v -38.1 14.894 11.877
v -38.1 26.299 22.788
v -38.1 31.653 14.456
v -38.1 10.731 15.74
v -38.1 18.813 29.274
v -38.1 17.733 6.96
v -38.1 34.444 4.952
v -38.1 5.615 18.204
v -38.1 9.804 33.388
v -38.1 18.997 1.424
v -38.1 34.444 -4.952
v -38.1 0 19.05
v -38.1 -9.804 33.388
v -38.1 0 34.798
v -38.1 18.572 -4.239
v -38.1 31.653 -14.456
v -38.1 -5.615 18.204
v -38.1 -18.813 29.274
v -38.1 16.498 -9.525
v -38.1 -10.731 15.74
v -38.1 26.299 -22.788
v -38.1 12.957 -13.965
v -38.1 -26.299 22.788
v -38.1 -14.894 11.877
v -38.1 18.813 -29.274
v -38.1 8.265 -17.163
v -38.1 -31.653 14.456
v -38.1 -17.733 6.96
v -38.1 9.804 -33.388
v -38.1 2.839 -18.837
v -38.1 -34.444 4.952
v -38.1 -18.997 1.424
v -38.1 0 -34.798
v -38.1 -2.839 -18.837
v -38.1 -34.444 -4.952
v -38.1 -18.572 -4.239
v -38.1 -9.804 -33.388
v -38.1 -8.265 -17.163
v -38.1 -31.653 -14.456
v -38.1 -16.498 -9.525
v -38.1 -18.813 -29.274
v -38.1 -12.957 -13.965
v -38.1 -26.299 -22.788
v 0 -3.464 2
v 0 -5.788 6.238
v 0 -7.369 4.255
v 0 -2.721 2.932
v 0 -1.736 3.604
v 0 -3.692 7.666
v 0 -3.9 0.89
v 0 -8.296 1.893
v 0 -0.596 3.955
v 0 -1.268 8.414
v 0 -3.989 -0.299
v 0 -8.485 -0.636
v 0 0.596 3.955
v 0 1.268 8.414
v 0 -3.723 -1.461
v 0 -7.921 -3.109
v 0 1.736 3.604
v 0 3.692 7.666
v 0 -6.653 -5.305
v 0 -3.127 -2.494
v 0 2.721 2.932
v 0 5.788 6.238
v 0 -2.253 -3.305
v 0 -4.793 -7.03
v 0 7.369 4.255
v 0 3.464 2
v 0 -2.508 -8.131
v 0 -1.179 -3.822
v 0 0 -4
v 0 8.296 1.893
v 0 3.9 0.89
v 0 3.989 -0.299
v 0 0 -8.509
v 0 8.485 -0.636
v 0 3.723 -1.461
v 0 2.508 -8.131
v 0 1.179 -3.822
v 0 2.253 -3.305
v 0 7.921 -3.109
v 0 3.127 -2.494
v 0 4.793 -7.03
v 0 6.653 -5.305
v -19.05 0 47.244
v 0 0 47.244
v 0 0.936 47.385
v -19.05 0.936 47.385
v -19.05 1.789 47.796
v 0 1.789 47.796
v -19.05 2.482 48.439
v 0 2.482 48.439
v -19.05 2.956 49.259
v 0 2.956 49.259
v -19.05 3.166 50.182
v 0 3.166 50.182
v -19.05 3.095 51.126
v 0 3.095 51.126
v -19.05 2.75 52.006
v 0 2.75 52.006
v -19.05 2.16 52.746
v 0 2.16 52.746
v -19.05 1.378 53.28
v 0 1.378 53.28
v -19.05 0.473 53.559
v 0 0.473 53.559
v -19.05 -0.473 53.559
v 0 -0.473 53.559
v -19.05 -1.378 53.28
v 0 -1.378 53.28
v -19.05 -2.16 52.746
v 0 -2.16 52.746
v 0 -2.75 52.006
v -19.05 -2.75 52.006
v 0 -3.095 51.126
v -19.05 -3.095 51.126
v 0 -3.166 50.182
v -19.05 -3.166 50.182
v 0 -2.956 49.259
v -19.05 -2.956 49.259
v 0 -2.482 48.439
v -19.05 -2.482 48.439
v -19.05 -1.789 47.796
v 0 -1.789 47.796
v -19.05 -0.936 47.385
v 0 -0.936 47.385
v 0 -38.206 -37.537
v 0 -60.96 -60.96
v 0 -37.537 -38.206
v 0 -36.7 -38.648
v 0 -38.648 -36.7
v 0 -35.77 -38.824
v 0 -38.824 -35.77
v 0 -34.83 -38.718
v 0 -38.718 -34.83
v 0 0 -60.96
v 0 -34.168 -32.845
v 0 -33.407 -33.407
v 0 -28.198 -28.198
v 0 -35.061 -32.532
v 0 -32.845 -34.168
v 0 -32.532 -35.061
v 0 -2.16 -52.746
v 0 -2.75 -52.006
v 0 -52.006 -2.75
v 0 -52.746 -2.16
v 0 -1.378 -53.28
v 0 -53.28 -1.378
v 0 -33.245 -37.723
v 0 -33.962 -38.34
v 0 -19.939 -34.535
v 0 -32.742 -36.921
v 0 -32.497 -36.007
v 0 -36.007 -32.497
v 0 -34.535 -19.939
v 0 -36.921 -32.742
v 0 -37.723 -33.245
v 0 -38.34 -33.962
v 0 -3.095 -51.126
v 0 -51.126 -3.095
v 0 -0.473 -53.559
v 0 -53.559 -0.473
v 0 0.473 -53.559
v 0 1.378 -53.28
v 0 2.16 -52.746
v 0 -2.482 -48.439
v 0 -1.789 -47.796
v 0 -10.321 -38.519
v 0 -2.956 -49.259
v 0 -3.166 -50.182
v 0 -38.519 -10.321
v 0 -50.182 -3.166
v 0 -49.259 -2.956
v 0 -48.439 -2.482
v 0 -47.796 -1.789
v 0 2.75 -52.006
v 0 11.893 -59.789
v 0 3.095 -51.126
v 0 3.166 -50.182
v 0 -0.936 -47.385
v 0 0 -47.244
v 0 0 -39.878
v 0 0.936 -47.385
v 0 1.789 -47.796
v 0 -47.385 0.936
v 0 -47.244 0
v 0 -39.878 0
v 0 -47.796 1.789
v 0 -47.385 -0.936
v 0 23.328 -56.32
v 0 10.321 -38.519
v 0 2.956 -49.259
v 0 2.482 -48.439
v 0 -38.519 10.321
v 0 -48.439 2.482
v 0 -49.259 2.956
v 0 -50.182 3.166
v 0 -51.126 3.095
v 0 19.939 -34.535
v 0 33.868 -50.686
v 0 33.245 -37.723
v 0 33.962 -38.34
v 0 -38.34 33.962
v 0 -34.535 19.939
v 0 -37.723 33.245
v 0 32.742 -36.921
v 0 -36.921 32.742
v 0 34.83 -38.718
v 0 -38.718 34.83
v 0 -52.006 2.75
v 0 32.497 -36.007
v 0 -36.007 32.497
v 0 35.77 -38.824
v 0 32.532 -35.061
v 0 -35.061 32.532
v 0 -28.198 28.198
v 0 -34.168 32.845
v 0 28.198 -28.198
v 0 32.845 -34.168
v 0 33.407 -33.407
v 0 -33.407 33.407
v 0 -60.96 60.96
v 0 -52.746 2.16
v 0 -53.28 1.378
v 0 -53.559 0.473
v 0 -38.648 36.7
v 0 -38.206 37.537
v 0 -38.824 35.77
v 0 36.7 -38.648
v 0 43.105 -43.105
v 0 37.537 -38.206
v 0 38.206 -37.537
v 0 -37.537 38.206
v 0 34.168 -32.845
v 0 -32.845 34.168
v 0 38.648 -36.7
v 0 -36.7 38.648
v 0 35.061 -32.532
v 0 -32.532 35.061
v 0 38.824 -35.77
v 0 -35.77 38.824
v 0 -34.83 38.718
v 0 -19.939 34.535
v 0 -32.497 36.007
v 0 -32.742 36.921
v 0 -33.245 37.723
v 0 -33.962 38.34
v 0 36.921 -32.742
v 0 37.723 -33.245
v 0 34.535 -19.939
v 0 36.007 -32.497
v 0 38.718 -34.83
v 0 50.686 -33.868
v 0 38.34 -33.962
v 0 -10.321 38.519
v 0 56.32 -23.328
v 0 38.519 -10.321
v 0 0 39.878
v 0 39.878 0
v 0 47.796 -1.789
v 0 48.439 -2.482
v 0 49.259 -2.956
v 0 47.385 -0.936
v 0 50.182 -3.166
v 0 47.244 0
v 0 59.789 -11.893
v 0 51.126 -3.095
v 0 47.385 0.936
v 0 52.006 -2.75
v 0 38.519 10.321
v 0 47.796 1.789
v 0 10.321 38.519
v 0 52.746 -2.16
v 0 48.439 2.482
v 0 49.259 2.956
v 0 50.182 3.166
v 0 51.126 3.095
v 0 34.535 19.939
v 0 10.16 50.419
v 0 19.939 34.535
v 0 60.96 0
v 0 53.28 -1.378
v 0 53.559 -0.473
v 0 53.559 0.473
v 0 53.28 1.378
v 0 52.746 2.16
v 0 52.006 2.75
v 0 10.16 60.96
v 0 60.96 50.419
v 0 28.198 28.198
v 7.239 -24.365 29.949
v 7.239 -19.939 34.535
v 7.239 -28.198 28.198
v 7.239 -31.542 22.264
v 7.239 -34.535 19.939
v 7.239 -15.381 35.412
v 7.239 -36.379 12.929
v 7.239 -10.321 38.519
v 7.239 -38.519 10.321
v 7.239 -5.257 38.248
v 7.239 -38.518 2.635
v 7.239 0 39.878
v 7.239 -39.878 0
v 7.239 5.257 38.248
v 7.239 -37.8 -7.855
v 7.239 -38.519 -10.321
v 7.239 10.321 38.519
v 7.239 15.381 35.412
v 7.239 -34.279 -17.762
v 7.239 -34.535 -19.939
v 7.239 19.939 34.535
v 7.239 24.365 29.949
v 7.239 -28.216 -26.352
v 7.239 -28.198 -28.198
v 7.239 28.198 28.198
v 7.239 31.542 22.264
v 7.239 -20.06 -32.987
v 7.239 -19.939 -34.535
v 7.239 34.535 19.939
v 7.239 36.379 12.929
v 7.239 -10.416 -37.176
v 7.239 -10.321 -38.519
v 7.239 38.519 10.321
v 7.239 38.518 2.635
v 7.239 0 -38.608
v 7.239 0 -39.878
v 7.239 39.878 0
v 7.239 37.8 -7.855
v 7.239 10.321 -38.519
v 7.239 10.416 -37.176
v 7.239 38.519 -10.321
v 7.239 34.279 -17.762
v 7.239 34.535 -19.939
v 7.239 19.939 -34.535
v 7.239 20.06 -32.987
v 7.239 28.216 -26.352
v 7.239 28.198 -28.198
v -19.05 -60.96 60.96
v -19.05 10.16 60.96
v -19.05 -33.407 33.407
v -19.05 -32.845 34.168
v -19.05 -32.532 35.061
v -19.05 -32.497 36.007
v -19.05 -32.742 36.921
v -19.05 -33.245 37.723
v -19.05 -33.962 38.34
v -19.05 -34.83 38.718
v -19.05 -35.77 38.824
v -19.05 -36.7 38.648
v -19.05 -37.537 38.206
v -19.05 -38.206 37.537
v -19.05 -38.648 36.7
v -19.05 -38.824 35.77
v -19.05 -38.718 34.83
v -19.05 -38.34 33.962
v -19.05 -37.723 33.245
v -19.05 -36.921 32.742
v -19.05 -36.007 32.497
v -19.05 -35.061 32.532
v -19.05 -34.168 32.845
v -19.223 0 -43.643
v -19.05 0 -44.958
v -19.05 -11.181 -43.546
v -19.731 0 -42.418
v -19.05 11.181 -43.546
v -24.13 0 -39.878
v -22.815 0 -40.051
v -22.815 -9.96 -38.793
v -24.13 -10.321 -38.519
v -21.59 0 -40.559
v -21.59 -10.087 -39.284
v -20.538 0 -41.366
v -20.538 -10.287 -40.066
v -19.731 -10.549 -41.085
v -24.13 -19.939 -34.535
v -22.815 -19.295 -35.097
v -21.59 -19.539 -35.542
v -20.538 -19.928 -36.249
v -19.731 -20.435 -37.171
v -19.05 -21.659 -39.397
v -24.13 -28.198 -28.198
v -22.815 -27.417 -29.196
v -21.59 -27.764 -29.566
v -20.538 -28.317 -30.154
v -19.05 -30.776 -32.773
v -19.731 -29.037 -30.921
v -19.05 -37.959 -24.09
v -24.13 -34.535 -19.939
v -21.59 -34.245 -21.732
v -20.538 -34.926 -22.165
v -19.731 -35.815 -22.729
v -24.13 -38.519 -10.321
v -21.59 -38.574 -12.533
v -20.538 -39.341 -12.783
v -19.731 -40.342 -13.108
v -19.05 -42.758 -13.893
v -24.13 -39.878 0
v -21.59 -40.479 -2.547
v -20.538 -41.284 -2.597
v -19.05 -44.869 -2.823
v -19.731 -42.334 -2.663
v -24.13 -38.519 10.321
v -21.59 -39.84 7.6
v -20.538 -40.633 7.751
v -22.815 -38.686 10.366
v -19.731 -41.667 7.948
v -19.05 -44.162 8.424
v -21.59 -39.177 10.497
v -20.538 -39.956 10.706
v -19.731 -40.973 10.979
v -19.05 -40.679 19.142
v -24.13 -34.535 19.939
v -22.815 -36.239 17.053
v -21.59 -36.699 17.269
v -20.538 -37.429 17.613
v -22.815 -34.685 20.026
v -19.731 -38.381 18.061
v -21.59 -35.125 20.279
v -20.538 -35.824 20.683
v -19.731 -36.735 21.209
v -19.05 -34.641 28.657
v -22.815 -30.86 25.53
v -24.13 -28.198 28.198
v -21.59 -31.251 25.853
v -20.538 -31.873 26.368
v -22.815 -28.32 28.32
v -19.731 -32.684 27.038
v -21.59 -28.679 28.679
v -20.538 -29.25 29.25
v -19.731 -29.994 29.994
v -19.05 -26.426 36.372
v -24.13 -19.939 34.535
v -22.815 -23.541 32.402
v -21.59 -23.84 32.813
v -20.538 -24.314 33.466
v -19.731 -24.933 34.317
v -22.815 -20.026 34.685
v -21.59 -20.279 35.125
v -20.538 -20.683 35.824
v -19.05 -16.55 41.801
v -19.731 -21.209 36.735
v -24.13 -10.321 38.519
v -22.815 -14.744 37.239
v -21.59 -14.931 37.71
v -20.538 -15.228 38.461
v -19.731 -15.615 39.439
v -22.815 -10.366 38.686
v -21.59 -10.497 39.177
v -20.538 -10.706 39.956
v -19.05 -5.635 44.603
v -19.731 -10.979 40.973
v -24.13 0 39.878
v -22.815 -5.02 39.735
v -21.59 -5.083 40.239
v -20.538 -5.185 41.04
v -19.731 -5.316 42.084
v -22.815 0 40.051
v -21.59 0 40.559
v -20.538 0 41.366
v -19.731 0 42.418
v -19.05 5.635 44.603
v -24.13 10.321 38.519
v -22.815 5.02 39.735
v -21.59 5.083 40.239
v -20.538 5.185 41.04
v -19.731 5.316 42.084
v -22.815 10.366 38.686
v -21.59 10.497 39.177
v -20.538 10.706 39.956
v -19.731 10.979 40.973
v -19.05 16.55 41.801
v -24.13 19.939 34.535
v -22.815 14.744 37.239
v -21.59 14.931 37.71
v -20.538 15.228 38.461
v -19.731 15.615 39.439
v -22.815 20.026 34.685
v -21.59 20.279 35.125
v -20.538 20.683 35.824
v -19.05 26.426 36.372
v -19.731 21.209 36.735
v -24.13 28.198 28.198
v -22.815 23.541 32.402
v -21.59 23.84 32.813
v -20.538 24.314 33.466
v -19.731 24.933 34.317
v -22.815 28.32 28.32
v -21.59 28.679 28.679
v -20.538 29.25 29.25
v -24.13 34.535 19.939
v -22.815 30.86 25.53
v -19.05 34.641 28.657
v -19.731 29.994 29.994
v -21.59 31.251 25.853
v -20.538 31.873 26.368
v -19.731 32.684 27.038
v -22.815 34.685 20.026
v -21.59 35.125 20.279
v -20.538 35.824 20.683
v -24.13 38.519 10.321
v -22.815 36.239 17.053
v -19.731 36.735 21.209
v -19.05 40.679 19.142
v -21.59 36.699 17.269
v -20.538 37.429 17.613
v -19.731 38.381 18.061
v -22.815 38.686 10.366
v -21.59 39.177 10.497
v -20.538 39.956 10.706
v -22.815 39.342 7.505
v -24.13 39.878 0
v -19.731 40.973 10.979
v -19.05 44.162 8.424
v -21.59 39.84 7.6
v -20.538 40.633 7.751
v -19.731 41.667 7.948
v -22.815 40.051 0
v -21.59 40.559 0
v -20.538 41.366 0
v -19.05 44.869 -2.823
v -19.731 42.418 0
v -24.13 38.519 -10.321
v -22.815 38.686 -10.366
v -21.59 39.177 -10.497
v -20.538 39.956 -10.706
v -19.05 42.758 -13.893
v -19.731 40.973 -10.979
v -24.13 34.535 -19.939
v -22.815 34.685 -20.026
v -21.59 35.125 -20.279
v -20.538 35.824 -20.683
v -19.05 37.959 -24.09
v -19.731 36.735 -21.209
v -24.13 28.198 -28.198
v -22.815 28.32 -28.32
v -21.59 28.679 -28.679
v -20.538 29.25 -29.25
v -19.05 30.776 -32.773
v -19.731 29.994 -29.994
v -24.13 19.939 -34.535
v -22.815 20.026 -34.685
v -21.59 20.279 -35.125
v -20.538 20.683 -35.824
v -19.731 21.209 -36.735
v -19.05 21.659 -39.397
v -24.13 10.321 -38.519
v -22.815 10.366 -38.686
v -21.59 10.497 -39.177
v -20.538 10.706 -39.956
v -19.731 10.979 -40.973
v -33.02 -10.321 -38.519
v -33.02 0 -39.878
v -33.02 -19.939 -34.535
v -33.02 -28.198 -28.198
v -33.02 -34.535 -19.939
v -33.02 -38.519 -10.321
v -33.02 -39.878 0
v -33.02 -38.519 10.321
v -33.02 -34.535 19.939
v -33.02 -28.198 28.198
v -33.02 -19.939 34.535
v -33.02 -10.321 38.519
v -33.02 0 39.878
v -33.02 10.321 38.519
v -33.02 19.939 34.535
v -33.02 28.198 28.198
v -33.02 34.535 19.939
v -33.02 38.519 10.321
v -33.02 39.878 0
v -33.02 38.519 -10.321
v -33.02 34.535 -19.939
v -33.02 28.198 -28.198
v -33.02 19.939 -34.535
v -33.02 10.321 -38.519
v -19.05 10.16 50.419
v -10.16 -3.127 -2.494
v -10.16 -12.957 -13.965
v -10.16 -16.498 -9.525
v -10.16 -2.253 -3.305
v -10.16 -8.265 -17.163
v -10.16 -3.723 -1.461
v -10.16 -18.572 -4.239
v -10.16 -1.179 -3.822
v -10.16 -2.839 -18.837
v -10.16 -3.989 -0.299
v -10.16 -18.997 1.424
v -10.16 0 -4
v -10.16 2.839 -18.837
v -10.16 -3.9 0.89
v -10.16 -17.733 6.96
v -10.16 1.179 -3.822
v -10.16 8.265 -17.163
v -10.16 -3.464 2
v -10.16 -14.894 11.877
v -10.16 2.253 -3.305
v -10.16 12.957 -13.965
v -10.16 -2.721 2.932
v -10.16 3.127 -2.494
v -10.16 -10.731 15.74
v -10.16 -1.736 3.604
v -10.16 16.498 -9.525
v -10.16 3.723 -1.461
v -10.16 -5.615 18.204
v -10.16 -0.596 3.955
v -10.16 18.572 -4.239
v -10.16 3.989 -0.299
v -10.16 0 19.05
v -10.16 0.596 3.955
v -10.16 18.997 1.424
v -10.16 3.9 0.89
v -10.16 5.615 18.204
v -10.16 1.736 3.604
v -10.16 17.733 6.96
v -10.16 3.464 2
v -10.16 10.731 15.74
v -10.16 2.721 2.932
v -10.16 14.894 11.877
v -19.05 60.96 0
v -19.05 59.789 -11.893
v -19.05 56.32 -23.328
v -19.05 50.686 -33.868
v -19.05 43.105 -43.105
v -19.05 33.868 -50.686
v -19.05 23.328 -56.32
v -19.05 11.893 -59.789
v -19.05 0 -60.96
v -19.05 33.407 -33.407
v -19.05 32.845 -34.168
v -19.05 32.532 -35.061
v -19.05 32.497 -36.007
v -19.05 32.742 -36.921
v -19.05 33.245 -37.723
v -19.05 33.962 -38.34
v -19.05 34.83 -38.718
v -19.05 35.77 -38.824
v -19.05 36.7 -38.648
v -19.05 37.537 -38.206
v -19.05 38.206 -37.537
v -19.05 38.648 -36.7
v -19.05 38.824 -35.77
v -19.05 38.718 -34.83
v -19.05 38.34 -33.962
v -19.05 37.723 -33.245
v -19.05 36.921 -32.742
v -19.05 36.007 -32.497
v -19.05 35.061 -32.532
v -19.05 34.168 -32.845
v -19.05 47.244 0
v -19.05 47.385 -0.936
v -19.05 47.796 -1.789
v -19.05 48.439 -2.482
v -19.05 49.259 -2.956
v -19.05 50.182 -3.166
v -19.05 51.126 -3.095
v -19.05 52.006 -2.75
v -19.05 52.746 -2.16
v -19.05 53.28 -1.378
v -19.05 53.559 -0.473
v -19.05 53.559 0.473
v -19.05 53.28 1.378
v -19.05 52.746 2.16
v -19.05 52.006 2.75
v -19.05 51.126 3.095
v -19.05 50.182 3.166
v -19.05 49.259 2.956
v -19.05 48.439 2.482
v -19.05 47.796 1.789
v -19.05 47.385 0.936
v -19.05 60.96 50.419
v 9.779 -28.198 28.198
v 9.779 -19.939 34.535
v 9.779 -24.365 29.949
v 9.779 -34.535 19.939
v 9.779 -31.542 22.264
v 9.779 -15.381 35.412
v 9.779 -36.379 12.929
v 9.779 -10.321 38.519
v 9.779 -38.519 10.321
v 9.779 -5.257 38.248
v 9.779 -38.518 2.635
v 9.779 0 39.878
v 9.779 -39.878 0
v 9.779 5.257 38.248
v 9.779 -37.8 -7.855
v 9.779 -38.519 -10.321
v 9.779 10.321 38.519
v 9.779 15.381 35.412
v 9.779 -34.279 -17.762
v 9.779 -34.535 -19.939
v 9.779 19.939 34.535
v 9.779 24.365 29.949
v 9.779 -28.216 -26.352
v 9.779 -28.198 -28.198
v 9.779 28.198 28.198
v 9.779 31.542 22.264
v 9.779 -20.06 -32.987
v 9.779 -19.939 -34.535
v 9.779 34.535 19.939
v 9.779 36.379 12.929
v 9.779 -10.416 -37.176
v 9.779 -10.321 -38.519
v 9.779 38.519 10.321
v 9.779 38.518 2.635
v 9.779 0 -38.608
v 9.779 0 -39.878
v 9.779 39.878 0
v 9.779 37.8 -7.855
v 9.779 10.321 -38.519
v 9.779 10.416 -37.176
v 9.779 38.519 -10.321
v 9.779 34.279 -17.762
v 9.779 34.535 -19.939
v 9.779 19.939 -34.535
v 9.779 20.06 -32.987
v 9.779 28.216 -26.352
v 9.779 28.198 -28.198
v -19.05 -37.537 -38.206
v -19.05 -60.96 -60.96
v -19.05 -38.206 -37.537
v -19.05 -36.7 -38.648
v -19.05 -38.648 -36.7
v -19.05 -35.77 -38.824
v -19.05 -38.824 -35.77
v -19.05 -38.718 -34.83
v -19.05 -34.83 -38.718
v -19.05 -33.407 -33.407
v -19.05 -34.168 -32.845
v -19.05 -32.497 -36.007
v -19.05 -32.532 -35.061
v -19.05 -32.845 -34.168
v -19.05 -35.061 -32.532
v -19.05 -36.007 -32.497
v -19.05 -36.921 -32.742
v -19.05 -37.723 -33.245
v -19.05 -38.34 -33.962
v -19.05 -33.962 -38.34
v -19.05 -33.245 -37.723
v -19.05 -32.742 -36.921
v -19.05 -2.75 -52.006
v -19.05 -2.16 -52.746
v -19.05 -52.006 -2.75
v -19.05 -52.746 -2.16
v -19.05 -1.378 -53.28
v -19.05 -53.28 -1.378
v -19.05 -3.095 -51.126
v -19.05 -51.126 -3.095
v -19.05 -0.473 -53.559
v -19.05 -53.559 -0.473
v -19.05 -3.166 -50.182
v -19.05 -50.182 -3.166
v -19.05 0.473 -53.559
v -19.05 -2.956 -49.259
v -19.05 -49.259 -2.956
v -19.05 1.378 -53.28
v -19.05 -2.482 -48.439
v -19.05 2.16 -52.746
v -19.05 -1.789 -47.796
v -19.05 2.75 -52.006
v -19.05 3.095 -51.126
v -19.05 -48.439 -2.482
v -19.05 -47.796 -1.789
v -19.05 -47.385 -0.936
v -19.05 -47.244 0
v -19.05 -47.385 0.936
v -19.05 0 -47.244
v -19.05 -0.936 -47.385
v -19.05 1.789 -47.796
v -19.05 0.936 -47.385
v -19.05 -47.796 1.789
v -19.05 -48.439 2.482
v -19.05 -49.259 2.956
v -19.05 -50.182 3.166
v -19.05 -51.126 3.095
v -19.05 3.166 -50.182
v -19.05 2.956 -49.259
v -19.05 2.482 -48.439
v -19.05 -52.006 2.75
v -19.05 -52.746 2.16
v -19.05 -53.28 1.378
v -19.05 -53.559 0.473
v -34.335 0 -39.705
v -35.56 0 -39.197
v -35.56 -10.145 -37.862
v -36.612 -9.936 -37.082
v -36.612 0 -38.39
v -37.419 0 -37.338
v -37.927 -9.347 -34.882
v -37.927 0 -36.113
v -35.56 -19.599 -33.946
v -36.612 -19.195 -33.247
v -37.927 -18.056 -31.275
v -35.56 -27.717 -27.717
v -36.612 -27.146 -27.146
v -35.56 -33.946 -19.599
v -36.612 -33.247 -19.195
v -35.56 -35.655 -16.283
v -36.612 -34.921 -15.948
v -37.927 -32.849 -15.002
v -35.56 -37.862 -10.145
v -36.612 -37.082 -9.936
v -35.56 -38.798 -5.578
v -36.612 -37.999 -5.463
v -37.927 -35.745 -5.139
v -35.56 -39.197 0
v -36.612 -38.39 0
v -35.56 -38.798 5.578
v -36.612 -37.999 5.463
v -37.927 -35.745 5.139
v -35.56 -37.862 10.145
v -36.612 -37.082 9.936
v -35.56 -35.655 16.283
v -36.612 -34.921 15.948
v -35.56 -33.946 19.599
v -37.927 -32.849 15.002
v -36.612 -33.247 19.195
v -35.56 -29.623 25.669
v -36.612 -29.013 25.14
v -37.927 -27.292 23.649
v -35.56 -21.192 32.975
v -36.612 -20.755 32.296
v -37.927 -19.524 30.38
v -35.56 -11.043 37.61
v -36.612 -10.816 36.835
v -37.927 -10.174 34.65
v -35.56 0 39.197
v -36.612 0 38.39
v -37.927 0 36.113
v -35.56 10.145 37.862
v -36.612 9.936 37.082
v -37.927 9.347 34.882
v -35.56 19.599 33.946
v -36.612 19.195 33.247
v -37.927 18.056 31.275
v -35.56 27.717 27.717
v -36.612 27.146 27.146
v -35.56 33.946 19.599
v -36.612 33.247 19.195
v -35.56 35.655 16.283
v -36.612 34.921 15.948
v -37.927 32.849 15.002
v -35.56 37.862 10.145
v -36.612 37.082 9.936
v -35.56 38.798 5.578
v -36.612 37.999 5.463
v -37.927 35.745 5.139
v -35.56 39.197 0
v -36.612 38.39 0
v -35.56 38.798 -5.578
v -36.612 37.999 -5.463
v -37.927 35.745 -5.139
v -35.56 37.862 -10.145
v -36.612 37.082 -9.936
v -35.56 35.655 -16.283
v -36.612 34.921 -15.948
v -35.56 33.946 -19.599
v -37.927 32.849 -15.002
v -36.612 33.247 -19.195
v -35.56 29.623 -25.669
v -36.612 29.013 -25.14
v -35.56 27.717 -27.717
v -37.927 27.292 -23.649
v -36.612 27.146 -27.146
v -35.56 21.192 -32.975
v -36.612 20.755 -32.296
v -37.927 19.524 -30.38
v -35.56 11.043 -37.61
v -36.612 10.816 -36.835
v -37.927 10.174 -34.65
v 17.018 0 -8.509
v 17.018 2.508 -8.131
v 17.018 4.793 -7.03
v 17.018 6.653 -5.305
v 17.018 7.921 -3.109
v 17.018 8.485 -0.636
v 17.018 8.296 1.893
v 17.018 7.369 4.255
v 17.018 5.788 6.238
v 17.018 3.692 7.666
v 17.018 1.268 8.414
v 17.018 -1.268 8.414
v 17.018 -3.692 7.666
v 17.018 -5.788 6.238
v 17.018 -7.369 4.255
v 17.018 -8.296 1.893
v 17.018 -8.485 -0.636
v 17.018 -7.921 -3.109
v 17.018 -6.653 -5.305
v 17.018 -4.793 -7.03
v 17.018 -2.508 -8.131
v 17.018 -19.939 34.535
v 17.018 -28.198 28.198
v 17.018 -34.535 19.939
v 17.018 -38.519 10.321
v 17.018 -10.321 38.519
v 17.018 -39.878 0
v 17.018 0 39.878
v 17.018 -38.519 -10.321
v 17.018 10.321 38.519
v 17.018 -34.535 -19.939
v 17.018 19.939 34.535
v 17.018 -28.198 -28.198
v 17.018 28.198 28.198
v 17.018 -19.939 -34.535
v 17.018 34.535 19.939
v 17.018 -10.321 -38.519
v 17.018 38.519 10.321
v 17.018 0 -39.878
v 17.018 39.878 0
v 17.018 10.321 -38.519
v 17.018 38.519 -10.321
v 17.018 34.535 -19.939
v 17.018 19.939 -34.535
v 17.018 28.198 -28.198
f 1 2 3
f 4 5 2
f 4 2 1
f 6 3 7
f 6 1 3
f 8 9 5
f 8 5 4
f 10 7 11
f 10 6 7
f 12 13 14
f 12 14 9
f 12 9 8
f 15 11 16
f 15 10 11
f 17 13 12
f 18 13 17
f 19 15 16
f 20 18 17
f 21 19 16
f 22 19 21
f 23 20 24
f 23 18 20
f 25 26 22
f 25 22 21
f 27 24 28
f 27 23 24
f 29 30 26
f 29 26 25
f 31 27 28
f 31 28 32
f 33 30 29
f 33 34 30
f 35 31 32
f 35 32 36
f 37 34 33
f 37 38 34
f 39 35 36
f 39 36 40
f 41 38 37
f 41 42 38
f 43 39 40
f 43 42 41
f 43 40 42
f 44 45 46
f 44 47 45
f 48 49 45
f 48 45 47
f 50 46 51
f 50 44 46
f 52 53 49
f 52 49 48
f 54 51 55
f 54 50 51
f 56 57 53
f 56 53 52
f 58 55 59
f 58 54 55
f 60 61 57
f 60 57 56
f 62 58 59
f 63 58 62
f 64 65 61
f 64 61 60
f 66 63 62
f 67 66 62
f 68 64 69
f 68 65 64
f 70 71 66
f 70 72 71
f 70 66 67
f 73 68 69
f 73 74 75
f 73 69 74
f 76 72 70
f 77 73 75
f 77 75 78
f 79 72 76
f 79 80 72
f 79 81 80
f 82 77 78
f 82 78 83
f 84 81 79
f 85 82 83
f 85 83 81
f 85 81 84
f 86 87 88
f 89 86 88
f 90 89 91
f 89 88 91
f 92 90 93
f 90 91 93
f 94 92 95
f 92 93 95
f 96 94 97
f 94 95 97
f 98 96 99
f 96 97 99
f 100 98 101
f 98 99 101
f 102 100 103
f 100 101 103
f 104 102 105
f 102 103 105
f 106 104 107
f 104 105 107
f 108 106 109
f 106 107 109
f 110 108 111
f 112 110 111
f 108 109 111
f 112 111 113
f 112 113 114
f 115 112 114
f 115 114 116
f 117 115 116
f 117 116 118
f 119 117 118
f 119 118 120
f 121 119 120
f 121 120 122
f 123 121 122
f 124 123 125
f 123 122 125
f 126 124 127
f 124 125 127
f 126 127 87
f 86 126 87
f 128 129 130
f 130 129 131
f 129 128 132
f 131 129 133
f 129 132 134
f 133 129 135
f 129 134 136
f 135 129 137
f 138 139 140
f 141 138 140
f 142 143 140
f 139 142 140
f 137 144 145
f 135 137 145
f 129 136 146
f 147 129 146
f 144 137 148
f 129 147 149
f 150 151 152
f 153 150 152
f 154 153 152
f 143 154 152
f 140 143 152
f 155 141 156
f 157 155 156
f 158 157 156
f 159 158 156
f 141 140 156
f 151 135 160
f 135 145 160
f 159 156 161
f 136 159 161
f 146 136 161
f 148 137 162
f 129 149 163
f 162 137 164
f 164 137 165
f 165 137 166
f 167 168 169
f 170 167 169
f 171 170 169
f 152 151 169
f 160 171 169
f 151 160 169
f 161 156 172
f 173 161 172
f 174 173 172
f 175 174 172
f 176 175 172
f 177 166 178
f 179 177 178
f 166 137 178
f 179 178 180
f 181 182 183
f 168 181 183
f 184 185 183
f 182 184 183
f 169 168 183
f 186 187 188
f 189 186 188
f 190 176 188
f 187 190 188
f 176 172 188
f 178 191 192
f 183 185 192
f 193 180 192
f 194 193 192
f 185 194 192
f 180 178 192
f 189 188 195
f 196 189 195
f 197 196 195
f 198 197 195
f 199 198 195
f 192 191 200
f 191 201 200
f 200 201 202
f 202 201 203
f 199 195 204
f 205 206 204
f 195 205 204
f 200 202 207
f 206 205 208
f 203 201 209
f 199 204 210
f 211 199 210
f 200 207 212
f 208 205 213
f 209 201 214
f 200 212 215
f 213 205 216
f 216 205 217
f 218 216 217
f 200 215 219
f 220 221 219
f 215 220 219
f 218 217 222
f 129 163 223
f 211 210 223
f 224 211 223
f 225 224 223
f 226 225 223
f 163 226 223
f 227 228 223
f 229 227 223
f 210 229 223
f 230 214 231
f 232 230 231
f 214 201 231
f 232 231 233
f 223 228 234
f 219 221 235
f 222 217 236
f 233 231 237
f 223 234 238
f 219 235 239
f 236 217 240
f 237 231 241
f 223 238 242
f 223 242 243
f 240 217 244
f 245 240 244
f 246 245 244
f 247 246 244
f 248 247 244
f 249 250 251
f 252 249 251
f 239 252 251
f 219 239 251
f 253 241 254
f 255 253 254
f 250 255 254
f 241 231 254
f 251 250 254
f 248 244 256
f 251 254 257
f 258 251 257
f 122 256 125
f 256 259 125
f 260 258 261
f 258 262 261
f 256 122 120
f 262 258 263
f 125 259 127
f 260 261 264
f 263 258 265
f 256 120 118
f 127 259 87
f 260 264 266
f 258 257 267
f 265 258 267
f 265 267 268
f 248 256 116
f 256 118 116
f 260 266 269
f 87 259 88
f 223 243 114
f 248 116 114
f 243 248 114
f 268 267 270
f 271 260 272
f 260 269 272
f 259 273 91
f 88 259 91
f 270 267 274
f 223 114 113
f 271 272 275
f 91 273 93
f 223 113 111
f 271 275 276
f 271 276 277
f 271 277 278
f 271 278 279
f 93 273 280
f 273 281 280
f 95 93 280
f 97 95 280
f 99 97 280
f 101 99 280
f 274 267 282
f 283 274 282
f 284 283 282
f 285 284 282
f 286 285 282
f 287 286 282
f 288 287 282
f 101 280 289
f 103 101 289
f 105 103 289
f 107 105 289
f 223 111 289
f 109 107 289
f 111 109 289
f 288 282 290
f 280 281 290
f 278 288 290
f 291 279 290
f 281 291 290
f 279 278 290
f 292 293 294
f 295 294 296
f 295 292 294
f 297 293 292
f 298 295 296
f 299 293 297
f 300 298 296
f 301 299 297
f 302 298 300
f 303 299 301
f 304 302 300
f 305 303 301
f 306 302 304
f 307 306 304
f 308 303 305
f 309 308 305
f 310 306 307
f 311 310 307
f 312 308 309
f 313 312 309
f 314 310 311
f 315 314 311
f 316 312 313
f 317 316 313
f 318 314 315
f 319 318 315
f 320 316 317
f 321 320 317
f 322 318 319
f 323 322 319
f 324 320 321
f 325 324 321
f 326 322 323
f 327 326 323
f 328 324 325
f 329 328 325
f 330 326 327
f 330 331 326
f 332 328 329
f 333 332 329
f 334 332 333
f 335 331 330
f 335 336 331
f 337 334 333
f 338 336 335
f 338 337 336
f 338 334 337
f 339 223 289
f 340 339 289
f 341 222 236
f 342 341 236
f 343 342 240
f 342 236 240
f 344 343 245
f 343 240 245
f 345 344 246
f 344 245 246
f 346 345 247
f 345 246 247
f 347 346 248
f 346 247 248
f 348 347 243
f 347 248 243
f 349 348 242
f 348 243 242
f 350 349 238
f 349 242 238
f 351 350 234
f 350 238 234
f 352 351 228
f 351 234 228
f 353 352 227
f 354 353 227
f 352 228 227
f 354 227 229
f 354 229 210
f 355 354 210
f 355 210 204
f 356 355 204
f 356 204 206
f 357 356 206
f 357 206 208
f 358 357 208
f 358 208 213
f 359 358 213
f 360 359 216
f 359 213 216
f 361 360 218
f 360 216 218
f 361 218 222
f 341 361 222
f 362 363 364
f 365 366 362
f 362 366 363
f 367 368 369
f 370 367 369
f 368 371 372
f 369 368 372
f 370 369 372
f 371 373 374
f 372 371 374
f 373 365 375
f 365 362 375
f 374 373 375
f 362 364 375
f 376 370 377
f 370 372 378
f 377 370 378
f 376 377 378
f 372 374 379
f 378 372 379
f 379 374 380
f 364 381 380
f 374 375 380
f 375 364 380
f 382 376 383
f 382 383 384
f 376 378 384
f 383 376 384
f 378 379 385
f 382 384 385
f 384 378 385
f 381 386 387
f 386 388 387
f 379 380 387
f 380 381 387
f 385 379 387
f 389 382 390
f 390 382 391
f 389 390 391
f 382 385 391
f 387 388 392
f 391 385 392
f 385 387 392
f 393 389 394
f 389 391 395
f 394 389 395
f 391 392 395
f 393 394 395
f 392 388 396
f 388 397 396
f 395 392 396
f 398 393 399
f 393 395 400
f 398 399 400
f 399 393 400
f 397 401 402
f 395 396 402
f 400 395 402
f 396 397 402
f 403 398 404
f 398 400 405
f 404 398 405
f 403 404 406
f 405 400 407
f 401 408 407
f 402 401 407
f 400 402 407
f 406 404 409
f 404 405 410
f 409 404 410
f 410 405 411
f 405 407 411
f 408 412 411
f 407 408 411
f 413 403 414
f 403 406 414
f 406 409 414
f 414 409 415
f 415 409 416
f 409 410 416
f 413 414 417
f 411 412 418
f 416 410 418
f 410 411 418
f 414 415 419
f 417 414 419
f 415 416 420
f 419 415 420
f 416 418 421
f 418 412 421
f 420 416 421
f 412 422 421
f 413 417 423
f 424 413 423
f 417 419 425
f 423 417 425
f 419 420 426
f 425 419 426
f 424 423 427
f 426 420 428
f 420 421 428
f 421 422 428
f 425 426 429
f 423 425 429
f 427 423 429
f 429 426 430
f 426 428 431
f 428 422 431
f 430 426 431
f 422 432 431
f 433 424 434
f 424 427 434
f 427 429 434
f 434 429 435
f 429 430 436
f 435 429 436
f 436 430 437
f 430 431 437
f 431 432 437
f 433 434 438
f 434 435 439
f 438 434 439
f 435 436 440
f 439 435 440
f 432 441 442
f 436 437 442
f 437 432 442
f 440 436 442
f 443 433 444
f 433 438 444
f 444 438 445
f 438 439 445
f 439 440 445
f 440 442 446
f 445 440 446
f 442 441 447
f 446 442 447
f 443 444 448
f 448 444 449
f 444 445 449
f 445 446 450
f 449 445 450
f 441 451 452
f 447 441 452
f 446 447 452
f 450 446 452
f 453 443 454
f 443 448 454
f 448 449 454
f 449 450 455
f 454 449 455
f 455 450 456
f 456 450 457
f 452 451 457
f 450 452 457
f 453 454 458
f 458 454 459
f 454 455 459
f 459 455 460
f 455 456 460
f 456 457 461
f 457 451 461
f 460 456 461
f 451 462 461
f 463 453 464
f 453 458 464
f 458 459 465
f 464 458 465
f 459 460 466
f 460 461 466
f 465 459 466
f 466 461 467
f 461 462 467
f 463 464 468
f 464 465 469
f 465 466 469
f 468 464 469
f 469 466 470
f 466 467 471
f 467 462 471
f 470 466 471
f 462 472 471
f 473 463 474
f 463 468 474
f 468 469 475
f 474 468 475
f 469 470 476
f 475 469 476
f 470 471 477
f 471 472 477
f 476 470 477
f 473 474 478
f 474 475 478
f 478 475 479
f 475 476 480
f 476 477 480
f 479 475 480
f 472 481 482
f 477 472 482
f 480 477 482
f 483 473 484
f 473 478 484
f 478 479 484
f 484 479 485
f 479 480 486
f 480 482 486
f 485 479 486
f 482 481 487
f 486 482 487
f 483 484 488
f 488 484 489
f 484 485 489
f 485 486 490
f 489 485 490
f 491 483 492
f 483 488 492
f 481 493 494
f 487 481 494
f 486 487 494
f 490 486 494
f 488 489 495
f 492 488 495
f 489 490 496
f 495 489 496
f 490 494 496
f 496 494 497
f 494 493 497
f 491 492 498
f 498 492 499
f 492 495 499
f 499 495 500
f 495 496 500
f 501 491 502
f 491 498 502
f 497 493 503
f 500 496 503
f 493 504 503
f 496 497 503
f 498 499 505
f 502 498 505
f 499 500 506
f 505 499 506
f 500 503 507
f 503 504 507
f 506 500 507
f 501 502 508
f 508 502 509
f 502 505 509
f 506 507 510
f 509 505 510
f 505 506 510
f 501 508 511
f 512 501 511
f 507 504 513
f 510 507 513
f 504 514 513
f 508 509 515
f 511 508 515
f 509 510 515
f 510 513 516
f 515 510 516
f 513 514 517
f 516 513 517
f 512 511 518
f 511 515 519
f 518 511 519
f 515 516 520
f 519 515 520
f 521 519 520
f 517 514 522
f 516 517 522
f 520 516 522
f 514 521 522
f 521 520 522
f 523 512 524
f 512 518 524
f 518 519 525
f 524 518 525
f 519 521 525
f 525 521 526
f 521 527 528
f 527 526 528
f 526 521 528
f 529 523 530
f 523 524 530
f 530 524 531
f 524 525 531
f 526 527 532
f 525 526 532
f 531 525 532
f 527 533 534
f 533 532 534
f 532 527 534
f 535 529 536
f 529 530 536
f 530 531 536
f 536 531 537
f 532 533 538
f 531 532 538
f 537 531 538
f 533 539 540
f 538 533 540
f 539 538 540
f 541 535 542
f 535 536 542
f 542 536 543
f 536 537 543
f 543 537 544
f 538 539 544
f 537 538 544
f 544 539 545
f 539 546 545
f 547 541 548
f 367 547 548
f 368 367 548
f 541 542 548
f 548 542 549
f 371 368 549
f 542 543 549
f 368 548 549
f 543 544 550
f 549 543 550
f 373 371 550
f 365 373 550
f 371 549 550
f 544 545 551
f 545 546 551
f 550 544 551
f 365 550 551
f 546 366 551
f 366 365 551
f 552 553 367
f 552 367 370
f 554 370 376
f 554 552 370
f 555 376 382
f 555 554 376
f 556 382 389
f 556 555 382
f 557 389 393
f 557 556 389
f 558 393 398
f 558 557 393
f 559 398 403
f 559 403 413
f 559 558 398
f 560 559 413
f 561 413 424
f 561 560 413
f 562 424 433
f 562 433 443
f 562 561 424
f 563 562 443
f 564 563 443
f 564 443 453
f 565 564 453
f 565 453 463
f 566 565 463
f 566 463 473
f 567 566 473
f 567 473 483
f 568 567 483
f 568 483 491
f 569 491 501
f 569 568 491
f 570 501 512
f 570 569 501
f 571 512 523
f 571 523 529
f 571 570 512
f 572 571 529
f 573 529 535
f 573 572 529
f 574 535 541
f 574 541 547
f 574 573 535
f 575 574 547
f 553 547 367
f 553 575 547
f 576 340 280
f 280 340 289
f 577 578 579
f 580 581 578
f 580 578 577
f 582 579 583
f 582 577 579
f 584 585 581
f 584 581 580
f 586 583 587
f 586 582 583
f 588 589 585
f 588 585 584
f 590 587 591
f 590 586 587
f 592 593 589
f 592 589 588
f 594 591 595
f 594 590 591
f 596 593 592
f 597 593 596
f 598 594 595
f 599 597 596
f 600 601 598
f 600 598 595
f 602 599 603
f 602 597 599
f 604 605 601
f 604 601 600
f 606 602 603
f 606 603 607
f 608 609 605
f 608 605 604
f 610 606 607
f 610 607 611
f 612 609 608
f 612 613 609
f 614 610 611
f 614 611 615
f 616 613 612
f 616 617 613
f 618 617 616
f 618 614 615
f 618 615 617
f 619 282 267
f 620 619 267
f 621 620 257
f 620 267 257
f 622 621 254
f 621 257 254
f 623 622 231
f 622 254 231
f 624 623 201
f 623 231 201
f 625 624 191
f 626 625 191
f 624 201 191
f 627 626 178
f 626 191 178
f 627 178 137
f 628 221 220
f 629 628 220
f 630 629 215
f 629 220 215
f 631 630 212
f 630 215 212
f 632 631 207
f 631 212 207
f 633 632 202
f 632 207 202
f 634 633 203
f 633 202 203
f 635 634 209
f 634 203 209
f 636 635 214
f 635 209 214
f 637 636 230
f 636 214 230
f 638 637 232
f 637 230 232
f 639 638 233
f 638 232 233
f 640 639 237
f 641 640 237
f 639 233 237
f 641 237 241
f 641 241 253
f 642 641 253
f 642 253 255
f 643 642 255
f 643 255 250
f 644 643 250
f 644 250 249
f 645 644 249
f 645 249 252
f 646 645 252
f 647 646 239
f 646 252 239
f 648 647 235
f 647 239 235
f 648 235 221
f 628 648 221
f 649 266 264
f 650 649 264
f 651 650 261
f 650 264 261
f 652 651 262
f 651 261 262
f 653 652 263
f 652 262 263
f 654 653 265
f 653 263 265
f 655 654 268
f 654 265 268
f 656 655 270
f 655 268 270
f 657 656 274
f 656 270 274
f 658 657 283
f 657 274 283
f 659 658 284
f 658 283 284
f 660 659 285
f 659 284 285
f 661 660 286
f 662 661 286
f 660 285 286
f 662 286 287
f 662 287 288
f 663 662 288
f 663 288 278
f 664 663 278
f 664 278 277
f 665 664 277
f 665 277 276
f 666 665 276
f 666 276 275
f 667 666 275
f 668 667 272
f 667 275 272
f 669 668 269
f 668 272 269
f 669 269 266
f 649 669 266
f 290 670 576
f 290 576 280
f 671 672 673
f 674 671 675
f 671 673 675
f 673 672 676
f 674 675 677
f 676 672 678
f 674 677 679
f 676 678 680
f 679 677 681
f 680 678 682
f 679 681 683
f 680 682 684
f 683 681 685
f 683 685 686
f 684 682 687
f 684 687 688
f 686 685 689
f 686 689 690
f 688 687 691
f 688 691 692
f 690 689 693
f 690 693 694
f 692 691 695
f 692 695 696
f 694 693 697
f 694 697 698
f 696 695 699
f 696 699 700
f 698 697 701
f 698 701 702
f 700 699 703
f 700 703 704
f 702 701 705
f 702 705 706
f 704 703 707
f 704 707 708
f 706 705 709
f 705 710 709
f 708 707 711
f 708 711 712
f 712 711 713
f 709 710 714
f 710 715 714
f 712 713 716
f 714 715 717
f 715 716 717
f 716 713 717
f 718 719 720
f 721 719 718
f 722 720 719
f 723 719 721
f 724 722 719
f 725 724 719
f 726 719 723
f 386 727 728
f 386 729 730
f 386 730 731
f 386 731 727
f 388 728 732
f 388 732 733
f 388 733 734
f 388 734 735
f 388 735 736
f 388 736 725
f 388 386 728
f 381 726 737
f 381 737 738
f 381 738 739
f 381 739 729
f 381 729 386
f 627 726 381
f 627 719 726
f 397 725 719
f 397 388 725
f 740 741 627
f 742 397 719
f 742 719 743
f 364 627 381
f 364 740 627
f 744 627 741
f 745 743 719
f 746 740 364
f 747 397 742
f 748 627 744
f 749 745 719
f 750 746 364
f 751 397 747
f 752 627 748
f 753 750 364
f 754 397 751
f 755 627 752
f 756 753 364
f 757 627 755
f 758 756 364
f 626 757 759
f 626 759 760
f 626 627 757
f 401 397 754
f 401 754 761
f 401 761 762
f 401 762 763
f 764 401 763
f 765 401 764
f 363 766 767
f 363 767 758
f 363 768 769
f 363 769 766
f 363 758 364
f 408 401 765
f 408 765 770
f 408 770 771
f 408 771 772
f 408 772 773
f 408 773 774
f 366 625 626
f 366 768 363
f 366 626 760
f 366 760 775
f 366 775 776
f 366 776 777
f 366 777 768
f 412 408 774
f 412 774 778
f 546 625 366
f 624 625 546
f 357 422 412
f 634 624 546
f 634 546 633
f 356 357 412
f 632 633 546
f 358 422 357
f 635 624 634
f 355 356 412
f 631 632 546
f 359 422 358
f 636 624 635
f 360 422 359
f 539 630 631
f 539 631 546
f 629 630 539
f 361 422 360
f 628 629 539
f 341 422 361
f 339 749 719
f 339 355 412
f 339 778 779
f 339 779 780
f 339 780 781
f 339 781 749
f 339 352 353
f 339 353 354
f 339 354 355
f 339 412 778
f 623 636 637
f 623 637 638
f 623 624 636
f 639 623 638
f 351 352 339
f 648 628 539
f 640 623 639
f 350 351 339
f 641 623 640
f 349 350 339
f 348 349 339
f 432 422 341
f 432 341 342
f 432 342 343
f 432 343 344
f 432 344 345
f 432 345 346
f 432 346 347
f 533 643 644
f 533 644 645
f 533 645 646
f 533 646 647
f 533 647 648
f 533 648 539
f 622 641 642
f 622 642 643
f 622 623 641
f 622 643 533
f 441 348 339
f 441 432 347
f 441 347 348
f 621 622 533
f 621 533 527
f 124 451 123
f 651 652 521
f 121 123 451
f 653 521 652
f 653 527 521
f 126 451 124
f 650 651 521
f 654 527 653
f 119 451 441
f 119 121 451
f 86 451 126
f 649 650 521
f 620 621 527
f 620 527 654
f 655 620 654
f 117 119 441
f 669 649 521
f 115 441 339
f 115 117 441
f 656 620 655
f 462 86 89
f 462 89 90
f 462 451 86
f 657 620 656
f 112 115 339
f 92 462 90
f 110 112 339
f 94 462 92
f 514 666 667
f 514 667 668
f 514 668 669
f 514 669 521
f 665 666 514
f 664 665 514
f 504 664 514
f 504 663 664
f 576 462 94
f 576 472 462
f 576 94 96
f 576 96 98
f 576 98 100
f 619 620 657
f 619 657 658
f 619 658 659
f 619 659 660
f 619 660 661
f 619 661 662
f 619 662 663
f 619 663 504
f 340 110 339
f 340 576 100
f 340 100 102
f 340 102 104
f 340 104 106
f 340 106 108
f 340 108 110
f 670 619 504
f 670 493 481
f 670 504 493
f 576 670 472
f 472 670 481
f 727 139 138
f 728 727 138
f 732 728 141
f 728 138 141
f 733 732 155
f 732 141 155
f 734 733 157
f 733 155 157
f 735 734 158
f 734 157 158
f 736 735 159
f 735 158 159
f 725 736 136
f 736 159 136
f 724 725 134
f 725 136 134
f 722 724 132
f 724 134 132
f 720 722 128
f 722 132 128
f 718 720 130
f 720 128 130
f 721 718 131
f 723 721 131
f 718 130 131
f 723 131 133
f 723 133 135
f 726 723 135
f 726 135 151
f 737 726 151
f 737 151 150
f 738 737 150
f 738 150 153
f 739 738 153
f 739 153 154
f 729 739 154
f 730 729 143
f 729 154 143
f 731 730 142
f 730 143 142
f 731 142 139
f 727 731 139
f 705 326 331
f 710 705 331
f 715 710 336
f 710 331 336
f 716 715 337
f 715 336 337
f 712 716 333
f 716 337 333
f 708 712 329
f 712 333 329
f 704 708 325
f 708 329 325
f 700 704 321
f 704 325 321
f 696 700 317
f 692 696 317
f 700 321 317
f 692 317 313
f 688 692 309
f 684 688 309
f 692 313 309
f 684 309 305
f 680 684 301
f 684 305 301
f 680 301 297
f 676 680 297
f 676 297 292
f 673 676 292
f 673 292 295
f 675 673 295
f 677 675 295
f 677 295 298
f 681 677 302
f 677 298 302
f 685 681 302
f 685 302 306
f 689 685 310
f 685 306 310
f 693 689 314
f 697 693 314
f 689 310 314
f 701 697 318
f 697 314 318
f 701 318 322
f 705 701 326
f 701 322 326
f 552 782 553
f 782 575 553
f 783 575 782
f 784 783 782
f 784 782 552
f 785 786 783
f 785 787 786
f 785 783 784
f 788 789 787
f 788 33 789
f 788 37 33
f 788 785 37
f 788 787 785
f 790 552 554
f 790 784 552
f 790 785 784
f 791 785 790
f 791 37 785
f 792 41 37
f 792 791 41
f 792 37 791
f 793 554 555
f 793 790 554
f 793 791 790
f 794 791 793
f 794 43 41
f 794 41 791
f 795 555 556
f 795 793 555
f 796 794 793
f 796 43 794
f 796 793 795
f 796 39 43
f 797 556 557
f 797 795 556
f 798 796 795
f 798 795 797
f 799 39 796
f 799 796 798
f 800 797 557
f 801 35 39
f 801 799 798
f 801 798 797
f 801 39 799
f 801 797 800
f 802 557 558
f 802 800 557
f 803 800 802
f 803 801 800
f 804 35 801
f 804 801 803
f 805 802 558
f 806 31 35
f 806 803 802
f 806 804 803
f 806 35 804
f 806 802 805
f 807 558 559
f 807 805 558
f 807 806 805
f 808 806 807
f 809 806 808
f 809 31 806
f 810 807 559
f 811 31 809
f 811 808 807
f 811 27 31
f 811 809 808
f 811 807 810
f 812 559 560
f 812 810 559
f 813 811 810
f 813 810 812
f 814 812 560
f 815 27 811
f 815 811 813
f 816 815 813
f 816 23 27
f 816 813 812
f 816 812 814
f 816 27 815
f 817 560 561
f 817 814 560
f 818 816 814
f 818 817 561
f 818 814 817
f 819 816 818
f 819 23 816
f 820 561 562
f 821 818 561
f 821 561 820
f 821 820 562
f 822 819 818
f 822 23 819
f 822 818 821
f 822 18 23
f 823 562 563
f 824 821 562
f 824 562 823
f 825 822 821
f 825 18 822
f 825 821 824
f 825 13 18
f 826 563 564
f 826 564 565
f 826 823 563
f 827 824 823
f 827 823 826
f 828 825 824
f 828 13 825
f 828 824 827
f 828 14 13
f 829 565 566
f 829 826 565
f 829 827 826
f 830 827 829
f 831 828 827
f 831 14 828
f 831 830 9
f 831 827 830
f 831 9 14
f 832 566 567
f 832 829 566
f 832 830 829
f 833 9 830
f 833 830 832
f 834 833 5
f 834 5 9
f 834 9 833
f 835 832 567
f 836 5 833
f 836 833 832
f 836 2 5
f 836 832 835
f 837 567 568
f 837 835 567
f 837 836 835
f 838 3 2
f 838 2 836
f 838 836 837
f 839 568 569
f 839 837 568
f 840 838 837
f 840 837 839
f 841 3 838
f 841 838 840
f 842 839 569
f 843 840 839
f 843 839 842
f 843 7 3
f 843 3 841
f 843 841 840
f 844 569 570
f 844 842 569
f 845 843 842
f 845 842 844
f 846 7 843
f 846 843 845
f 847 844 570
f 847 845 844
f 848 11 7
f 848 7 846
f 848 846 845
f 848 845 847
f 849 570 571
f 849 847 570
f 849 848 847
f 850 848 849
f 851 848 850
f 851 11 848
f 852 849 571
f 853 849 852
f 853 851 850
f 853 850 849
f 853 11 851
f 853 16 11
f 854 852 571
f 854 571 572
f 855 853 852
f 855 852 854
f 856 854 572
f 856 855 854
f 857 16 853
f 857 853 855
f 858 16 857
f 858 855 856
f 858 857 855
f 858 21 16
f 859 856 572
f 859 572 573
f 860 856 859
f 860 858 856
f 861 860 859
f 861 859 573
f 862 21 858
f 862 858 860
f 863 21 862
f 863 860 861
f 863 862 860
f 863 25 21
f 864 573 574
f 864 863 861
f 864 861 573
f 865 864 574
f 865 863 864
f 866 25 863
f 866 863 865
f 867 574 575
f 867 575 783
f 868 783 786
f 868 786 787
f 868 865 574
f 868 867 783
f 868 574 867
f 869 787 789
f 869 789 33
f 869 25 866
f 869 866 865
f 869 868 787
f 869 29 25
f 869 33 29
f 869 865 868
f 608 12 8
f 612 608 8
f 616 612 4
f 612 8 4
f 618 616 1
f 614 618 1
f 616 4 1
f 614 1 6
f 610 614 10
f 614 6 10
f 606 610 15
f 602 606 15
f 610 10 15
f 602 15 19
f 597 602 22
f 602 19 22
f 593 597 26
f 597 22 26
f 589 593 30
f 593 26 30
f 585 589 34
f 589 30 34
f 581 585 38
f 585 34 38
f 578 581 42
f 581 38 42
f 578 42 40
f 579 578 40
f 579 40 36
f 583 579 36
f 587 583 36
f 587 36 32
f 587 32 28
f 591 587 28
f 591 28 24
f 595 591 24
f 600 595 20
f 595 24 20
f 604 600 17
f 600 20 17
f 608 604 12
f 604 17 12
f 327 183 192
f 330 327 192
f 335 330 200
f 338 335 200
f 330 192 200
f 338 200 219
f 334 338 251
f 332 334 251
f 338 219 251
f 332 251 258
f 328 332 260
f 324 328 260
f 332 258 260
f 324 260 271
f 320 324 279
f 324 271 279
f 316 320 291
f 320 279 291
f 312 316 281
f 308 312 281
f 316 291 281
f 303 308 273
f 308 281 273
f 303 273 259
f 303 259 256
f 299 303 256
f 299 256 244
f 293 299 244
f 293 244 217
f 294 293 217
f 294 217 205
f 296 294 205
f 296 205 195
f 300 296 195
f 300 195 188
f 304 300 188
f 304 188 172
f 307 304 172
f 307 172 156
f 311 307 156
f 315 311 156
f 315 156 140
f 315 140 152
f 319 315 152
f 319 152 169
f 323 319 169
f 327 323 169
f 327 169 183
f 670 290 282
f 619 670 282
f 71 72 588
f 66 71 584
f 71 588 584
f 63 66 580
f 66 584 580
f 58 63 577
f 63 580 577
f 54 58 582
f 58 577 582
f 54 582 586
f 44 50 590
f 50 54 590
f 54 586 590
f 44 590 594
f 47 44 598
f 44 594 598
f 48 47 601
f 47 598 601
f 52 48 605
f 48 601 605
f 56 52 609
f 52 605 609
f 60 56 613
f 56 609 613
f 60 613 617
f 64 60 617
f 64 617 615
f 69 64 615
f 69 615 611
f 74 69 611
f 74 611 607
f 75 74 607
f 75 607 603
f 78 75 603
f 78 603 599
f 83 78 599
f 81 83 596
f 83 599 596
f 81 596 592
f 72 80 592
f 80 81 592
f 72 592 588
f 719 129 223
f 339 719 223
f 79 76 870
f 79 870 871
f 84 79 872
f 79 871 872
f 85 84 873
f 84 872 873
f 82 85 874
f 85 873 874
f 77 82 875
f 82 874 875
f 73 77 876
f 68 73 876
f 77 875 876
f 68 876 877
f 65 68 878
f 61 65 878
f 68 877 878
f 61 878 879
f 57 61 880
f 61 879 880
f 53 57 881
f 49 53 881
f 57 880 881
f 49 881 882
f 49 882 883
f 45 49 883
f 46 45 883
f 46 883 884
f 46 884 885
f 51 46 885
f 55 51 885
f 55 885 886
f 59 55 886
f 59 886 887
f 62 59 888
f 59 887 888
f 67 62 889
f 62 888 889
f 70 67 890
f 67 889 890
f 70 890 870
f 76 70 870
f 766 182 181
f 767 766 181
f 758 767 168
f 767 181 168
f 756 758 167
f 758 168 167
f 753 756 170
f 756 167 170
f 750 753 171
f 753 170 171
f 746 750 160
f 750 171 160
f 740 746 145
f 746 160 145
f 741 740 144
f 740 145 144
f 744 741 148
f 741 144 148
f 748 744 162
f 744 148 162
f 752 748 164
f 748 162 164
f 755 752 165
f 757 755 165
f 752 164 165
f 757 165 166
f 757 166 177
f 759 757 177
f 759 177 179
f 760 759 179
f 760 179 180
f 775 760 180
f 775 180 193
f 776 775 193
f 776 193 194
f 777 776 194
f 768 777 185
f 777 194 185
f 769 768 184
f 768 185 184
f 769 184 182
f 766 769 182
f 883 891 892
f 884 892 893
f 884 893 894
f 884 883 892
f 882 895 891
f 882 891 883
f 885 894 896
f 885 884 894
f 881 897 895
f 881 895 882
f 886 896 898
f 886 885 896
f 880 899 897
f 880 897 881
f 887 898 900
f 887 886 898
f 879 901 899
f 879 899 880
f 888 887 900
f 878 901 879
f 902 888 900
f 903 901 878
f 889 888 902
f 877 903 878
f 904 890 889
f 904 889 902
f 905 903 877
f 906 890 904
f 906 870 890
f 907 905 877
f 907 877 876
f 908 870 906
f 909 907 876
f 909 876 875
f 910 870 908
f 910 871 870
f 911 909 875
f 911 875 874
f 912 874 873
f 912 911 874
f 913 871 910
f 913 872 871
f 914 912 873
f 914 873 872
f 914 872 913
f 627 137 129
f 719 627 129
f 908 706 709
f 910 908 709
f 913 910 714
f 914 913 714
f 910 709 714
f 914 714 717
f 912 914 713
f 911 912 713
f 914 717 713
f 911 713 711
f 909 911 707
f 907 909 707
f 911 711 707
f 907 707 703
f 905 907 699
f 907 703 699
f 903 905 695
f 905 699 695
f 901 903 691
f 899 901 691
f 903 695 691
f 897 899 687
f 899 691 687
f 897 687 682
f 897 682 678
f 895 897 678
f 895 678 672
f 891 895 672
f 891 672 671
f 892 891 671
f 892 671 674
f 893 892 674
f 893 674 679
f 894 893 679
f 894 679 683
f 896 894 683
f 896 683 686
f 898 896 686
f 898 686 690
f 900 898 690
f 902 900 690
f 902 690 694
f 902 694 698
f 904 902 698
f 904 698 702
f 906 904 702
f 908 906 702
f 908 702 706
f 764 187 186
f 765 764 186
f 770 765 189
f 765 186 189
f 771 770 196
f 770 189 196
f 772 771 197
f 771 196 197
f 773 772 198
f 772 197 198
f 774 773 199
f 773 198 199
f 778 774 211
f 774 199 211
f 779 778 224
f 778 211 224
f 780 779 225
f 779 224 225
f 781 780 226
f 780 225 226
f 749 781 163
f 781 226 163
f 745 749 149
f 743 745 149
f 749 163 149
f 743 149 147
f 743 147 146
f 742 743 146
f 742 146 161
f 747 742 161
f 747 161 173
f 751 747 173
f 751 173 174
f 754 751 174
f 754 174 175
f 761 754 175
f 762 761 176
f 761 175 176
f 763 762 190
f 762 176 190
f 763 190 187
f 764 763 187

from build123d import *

# Parameters (mm, degrees)
SKETCH1_R                     = 39.878
HOUSING_FITTING_EXTRUDE_DEPTH = 17.018
HOUSING_BODY_1_DEPTH          = 19.05
SKETCH3_R                     = 8.509
IMPELLER_BORE_DEPTH           = 17.018
SKETCH4_R                     = 4
SHAFT_BORE_DEPTH              = 70.612
O_RING_CUT_DEPTH              = 1.27
O_RING_CUT_DEPTH_BACK         = 1.27
SKETCH5_R                     = 39.878
SKETCH5_R_2                   = 38.608
SEAL_START                    = 19.05
SKETCH7_R                     = 39.878
SKETCH7_R_2                   = 4
SEAL_SIDE_BODY_EXT_DEPTH      = 19.05
EXT_FILLET_R                  = 5.08
SKETCH10_W                    = 19.05
SKETCH10_H                    = 50.8
DISCHARGE_CUT_DEPTH           = 10.541
SKETCH11_R                    = 19.05
CUT_EXTRUDE1_DEPTH            = 27.94
SKETCH12_R                    = 3.175
CUT_EXTRUDE2_DEPTH            = 19.05
CIRPATTERN1_COUNT             = 8


with BuildPart() as part:
    # Sketch1 → Housing Fitting Extrude (new body)
    with BuildSketch(Plane(origin=(0, 0, 0), x_dir=(0, 0, -1), z_dir=(1, 0, 0))):
        Circle(SKETCH1_R)
    extrude(amount=HOUSING_FITTING_EXTRUDE_DEPTH)

    # Sketch2 → Housing Body 1 (add)
    with BuildSketch(Plane.ZY):
        with BuildLine():
            Line((60.96, 0), (60.96, 60.96))
            Line((60.96, 60.96), (0, 60.96))
            ThreePointArc((0, 60.96), (-43.105229381, 43.105229381), (-60.96, 0))
            Line((-60.96, 0), (-60.96, -54.61))
            Line((-60.96, -54.61), (-60.96, -60.96))
            Line((-60.96, -60.96), (60.96, -60.96))
            Line((60.96, -60.96), (60.96, -54.61))
            Line((60.96, -54.61), (60.96, 0))
        make_face()
    extrude(amount=HOUSING_BODY_1_DEPTH)

    # Sketch3 → Impeller Bore (cut)
    with BuildSketch(Plane(origin=(17.018, 0, 0), x_dir=(0, 0, -1), z_dir=(1, 0, 0))):
        Circle(SKETCH3_R)
    extrude(amount=-IMPELLER_BORE_DEPTH, mode=Mode.SUBTRACT)

    # Sketch4 → Shaft Bore (cut)
    with BuildSketch(Plane(origin=(0, 0, 0), x_dir=(0, 0, -1), z_dir=(1, 0, 0))):
        Circle(SKETCH4_R)
    extrude(amount=-SHAFT_BORE_DEPTH, mode=Mode.SUBTRACT)

    # Sketch5 → O-Ring Cut (cut, two sides: drawn at the far end of the back side and taken through both)
    with BuildSketch(Plane(origin=(8.509, 0, 0), x_dir=(0, 0, -1), z_dir=(1, 0, 0)).offset(-O_RING_CUT_DEPTH_BACK)):
        Circle(SKETCH5_R)
        Circle(SKETCH5_R_2, mode=Mode.SUBTRACT)
    extrude(amount=O_RING_CUT_DEPTH + O_RING_CUT_DEPTH_BACK, mode=Mode.SUBTRACT)

    # Sketch7 → Seal Side Body Ext (add)
    with BuildSketch(Plane.ZY.offset(19.05).offset(SEAL_START)):
        with Locations(Location((0, 0, 0), (0, 0, 180))):
            Circle(SKETCH7_R)
        with Locations(Location((0, 0, 0), (0, 0, 180))):
            Circle(SKETCH7_R_2, mode=Mode.SUBTRACT)
    extrude(amount=-SEAL_SIDE_BODY_EXT_DEPTH)

    # Ext Fillet
    ext_fillet_edges = [part.edges().sort_by_distance(p)[0] for p in [
        (-38.1, 0, 39.878),
        (-19.05, 0, 39.878),
    ]]
    fillet(ext_fillet_edges, radius=EXT_FILLET_R)

    # Sketch10 → Discharge Cut (cut)
    with BuildSketch(Plane.XY.offset(60.96)):
        with Locations((-9.525, 35.56)):
            Rectangle(SKETCH10_W, SKETCH10_H)
    extrude(amount=-DISCHARGE_CUT_DEPTH, mode=Mode.SUBTRACT)

    # Sketch11 → Cut-Extrude1 (cut)
    with BuildSketch(Plane.ZY.offset(38.1)):
        Circle(SKETCH11_R)
    extrude(amount=-CUT_EXTRUDE1_DEPTH, mode=Mode.SUBTRACT)

    # Sketch12 → Cut-Extrude2 (cut)
    with BuildSketch(Plane(origin=(0, 0, 0), x_dir=(0, 0, -1), z_dir=(1, 0, 0))):
        with Locations((-50.419, 0)):
            Circle(SKETCH12_R)
    cut_extrude2 = extrude(amount=-CUT_EXTRUDE2_DEPTH, mode=Mode.SUBTRACT)

    # CirPattern1: Cut-Extrude2 ×8 about axis, 1 skipped
    cirpattern1_axis = Axis((0, 0, 0), (1, 0, 0))
    add([cut_extrude2.rotate(cirpattern1_axis, i * 360 / CIRPATTERN1_COUNT) for i in range(1, CIRPATTERN1_COUNT) if i not in (7,)], mode=Mode.SUBTRACT)


solid = part.part
